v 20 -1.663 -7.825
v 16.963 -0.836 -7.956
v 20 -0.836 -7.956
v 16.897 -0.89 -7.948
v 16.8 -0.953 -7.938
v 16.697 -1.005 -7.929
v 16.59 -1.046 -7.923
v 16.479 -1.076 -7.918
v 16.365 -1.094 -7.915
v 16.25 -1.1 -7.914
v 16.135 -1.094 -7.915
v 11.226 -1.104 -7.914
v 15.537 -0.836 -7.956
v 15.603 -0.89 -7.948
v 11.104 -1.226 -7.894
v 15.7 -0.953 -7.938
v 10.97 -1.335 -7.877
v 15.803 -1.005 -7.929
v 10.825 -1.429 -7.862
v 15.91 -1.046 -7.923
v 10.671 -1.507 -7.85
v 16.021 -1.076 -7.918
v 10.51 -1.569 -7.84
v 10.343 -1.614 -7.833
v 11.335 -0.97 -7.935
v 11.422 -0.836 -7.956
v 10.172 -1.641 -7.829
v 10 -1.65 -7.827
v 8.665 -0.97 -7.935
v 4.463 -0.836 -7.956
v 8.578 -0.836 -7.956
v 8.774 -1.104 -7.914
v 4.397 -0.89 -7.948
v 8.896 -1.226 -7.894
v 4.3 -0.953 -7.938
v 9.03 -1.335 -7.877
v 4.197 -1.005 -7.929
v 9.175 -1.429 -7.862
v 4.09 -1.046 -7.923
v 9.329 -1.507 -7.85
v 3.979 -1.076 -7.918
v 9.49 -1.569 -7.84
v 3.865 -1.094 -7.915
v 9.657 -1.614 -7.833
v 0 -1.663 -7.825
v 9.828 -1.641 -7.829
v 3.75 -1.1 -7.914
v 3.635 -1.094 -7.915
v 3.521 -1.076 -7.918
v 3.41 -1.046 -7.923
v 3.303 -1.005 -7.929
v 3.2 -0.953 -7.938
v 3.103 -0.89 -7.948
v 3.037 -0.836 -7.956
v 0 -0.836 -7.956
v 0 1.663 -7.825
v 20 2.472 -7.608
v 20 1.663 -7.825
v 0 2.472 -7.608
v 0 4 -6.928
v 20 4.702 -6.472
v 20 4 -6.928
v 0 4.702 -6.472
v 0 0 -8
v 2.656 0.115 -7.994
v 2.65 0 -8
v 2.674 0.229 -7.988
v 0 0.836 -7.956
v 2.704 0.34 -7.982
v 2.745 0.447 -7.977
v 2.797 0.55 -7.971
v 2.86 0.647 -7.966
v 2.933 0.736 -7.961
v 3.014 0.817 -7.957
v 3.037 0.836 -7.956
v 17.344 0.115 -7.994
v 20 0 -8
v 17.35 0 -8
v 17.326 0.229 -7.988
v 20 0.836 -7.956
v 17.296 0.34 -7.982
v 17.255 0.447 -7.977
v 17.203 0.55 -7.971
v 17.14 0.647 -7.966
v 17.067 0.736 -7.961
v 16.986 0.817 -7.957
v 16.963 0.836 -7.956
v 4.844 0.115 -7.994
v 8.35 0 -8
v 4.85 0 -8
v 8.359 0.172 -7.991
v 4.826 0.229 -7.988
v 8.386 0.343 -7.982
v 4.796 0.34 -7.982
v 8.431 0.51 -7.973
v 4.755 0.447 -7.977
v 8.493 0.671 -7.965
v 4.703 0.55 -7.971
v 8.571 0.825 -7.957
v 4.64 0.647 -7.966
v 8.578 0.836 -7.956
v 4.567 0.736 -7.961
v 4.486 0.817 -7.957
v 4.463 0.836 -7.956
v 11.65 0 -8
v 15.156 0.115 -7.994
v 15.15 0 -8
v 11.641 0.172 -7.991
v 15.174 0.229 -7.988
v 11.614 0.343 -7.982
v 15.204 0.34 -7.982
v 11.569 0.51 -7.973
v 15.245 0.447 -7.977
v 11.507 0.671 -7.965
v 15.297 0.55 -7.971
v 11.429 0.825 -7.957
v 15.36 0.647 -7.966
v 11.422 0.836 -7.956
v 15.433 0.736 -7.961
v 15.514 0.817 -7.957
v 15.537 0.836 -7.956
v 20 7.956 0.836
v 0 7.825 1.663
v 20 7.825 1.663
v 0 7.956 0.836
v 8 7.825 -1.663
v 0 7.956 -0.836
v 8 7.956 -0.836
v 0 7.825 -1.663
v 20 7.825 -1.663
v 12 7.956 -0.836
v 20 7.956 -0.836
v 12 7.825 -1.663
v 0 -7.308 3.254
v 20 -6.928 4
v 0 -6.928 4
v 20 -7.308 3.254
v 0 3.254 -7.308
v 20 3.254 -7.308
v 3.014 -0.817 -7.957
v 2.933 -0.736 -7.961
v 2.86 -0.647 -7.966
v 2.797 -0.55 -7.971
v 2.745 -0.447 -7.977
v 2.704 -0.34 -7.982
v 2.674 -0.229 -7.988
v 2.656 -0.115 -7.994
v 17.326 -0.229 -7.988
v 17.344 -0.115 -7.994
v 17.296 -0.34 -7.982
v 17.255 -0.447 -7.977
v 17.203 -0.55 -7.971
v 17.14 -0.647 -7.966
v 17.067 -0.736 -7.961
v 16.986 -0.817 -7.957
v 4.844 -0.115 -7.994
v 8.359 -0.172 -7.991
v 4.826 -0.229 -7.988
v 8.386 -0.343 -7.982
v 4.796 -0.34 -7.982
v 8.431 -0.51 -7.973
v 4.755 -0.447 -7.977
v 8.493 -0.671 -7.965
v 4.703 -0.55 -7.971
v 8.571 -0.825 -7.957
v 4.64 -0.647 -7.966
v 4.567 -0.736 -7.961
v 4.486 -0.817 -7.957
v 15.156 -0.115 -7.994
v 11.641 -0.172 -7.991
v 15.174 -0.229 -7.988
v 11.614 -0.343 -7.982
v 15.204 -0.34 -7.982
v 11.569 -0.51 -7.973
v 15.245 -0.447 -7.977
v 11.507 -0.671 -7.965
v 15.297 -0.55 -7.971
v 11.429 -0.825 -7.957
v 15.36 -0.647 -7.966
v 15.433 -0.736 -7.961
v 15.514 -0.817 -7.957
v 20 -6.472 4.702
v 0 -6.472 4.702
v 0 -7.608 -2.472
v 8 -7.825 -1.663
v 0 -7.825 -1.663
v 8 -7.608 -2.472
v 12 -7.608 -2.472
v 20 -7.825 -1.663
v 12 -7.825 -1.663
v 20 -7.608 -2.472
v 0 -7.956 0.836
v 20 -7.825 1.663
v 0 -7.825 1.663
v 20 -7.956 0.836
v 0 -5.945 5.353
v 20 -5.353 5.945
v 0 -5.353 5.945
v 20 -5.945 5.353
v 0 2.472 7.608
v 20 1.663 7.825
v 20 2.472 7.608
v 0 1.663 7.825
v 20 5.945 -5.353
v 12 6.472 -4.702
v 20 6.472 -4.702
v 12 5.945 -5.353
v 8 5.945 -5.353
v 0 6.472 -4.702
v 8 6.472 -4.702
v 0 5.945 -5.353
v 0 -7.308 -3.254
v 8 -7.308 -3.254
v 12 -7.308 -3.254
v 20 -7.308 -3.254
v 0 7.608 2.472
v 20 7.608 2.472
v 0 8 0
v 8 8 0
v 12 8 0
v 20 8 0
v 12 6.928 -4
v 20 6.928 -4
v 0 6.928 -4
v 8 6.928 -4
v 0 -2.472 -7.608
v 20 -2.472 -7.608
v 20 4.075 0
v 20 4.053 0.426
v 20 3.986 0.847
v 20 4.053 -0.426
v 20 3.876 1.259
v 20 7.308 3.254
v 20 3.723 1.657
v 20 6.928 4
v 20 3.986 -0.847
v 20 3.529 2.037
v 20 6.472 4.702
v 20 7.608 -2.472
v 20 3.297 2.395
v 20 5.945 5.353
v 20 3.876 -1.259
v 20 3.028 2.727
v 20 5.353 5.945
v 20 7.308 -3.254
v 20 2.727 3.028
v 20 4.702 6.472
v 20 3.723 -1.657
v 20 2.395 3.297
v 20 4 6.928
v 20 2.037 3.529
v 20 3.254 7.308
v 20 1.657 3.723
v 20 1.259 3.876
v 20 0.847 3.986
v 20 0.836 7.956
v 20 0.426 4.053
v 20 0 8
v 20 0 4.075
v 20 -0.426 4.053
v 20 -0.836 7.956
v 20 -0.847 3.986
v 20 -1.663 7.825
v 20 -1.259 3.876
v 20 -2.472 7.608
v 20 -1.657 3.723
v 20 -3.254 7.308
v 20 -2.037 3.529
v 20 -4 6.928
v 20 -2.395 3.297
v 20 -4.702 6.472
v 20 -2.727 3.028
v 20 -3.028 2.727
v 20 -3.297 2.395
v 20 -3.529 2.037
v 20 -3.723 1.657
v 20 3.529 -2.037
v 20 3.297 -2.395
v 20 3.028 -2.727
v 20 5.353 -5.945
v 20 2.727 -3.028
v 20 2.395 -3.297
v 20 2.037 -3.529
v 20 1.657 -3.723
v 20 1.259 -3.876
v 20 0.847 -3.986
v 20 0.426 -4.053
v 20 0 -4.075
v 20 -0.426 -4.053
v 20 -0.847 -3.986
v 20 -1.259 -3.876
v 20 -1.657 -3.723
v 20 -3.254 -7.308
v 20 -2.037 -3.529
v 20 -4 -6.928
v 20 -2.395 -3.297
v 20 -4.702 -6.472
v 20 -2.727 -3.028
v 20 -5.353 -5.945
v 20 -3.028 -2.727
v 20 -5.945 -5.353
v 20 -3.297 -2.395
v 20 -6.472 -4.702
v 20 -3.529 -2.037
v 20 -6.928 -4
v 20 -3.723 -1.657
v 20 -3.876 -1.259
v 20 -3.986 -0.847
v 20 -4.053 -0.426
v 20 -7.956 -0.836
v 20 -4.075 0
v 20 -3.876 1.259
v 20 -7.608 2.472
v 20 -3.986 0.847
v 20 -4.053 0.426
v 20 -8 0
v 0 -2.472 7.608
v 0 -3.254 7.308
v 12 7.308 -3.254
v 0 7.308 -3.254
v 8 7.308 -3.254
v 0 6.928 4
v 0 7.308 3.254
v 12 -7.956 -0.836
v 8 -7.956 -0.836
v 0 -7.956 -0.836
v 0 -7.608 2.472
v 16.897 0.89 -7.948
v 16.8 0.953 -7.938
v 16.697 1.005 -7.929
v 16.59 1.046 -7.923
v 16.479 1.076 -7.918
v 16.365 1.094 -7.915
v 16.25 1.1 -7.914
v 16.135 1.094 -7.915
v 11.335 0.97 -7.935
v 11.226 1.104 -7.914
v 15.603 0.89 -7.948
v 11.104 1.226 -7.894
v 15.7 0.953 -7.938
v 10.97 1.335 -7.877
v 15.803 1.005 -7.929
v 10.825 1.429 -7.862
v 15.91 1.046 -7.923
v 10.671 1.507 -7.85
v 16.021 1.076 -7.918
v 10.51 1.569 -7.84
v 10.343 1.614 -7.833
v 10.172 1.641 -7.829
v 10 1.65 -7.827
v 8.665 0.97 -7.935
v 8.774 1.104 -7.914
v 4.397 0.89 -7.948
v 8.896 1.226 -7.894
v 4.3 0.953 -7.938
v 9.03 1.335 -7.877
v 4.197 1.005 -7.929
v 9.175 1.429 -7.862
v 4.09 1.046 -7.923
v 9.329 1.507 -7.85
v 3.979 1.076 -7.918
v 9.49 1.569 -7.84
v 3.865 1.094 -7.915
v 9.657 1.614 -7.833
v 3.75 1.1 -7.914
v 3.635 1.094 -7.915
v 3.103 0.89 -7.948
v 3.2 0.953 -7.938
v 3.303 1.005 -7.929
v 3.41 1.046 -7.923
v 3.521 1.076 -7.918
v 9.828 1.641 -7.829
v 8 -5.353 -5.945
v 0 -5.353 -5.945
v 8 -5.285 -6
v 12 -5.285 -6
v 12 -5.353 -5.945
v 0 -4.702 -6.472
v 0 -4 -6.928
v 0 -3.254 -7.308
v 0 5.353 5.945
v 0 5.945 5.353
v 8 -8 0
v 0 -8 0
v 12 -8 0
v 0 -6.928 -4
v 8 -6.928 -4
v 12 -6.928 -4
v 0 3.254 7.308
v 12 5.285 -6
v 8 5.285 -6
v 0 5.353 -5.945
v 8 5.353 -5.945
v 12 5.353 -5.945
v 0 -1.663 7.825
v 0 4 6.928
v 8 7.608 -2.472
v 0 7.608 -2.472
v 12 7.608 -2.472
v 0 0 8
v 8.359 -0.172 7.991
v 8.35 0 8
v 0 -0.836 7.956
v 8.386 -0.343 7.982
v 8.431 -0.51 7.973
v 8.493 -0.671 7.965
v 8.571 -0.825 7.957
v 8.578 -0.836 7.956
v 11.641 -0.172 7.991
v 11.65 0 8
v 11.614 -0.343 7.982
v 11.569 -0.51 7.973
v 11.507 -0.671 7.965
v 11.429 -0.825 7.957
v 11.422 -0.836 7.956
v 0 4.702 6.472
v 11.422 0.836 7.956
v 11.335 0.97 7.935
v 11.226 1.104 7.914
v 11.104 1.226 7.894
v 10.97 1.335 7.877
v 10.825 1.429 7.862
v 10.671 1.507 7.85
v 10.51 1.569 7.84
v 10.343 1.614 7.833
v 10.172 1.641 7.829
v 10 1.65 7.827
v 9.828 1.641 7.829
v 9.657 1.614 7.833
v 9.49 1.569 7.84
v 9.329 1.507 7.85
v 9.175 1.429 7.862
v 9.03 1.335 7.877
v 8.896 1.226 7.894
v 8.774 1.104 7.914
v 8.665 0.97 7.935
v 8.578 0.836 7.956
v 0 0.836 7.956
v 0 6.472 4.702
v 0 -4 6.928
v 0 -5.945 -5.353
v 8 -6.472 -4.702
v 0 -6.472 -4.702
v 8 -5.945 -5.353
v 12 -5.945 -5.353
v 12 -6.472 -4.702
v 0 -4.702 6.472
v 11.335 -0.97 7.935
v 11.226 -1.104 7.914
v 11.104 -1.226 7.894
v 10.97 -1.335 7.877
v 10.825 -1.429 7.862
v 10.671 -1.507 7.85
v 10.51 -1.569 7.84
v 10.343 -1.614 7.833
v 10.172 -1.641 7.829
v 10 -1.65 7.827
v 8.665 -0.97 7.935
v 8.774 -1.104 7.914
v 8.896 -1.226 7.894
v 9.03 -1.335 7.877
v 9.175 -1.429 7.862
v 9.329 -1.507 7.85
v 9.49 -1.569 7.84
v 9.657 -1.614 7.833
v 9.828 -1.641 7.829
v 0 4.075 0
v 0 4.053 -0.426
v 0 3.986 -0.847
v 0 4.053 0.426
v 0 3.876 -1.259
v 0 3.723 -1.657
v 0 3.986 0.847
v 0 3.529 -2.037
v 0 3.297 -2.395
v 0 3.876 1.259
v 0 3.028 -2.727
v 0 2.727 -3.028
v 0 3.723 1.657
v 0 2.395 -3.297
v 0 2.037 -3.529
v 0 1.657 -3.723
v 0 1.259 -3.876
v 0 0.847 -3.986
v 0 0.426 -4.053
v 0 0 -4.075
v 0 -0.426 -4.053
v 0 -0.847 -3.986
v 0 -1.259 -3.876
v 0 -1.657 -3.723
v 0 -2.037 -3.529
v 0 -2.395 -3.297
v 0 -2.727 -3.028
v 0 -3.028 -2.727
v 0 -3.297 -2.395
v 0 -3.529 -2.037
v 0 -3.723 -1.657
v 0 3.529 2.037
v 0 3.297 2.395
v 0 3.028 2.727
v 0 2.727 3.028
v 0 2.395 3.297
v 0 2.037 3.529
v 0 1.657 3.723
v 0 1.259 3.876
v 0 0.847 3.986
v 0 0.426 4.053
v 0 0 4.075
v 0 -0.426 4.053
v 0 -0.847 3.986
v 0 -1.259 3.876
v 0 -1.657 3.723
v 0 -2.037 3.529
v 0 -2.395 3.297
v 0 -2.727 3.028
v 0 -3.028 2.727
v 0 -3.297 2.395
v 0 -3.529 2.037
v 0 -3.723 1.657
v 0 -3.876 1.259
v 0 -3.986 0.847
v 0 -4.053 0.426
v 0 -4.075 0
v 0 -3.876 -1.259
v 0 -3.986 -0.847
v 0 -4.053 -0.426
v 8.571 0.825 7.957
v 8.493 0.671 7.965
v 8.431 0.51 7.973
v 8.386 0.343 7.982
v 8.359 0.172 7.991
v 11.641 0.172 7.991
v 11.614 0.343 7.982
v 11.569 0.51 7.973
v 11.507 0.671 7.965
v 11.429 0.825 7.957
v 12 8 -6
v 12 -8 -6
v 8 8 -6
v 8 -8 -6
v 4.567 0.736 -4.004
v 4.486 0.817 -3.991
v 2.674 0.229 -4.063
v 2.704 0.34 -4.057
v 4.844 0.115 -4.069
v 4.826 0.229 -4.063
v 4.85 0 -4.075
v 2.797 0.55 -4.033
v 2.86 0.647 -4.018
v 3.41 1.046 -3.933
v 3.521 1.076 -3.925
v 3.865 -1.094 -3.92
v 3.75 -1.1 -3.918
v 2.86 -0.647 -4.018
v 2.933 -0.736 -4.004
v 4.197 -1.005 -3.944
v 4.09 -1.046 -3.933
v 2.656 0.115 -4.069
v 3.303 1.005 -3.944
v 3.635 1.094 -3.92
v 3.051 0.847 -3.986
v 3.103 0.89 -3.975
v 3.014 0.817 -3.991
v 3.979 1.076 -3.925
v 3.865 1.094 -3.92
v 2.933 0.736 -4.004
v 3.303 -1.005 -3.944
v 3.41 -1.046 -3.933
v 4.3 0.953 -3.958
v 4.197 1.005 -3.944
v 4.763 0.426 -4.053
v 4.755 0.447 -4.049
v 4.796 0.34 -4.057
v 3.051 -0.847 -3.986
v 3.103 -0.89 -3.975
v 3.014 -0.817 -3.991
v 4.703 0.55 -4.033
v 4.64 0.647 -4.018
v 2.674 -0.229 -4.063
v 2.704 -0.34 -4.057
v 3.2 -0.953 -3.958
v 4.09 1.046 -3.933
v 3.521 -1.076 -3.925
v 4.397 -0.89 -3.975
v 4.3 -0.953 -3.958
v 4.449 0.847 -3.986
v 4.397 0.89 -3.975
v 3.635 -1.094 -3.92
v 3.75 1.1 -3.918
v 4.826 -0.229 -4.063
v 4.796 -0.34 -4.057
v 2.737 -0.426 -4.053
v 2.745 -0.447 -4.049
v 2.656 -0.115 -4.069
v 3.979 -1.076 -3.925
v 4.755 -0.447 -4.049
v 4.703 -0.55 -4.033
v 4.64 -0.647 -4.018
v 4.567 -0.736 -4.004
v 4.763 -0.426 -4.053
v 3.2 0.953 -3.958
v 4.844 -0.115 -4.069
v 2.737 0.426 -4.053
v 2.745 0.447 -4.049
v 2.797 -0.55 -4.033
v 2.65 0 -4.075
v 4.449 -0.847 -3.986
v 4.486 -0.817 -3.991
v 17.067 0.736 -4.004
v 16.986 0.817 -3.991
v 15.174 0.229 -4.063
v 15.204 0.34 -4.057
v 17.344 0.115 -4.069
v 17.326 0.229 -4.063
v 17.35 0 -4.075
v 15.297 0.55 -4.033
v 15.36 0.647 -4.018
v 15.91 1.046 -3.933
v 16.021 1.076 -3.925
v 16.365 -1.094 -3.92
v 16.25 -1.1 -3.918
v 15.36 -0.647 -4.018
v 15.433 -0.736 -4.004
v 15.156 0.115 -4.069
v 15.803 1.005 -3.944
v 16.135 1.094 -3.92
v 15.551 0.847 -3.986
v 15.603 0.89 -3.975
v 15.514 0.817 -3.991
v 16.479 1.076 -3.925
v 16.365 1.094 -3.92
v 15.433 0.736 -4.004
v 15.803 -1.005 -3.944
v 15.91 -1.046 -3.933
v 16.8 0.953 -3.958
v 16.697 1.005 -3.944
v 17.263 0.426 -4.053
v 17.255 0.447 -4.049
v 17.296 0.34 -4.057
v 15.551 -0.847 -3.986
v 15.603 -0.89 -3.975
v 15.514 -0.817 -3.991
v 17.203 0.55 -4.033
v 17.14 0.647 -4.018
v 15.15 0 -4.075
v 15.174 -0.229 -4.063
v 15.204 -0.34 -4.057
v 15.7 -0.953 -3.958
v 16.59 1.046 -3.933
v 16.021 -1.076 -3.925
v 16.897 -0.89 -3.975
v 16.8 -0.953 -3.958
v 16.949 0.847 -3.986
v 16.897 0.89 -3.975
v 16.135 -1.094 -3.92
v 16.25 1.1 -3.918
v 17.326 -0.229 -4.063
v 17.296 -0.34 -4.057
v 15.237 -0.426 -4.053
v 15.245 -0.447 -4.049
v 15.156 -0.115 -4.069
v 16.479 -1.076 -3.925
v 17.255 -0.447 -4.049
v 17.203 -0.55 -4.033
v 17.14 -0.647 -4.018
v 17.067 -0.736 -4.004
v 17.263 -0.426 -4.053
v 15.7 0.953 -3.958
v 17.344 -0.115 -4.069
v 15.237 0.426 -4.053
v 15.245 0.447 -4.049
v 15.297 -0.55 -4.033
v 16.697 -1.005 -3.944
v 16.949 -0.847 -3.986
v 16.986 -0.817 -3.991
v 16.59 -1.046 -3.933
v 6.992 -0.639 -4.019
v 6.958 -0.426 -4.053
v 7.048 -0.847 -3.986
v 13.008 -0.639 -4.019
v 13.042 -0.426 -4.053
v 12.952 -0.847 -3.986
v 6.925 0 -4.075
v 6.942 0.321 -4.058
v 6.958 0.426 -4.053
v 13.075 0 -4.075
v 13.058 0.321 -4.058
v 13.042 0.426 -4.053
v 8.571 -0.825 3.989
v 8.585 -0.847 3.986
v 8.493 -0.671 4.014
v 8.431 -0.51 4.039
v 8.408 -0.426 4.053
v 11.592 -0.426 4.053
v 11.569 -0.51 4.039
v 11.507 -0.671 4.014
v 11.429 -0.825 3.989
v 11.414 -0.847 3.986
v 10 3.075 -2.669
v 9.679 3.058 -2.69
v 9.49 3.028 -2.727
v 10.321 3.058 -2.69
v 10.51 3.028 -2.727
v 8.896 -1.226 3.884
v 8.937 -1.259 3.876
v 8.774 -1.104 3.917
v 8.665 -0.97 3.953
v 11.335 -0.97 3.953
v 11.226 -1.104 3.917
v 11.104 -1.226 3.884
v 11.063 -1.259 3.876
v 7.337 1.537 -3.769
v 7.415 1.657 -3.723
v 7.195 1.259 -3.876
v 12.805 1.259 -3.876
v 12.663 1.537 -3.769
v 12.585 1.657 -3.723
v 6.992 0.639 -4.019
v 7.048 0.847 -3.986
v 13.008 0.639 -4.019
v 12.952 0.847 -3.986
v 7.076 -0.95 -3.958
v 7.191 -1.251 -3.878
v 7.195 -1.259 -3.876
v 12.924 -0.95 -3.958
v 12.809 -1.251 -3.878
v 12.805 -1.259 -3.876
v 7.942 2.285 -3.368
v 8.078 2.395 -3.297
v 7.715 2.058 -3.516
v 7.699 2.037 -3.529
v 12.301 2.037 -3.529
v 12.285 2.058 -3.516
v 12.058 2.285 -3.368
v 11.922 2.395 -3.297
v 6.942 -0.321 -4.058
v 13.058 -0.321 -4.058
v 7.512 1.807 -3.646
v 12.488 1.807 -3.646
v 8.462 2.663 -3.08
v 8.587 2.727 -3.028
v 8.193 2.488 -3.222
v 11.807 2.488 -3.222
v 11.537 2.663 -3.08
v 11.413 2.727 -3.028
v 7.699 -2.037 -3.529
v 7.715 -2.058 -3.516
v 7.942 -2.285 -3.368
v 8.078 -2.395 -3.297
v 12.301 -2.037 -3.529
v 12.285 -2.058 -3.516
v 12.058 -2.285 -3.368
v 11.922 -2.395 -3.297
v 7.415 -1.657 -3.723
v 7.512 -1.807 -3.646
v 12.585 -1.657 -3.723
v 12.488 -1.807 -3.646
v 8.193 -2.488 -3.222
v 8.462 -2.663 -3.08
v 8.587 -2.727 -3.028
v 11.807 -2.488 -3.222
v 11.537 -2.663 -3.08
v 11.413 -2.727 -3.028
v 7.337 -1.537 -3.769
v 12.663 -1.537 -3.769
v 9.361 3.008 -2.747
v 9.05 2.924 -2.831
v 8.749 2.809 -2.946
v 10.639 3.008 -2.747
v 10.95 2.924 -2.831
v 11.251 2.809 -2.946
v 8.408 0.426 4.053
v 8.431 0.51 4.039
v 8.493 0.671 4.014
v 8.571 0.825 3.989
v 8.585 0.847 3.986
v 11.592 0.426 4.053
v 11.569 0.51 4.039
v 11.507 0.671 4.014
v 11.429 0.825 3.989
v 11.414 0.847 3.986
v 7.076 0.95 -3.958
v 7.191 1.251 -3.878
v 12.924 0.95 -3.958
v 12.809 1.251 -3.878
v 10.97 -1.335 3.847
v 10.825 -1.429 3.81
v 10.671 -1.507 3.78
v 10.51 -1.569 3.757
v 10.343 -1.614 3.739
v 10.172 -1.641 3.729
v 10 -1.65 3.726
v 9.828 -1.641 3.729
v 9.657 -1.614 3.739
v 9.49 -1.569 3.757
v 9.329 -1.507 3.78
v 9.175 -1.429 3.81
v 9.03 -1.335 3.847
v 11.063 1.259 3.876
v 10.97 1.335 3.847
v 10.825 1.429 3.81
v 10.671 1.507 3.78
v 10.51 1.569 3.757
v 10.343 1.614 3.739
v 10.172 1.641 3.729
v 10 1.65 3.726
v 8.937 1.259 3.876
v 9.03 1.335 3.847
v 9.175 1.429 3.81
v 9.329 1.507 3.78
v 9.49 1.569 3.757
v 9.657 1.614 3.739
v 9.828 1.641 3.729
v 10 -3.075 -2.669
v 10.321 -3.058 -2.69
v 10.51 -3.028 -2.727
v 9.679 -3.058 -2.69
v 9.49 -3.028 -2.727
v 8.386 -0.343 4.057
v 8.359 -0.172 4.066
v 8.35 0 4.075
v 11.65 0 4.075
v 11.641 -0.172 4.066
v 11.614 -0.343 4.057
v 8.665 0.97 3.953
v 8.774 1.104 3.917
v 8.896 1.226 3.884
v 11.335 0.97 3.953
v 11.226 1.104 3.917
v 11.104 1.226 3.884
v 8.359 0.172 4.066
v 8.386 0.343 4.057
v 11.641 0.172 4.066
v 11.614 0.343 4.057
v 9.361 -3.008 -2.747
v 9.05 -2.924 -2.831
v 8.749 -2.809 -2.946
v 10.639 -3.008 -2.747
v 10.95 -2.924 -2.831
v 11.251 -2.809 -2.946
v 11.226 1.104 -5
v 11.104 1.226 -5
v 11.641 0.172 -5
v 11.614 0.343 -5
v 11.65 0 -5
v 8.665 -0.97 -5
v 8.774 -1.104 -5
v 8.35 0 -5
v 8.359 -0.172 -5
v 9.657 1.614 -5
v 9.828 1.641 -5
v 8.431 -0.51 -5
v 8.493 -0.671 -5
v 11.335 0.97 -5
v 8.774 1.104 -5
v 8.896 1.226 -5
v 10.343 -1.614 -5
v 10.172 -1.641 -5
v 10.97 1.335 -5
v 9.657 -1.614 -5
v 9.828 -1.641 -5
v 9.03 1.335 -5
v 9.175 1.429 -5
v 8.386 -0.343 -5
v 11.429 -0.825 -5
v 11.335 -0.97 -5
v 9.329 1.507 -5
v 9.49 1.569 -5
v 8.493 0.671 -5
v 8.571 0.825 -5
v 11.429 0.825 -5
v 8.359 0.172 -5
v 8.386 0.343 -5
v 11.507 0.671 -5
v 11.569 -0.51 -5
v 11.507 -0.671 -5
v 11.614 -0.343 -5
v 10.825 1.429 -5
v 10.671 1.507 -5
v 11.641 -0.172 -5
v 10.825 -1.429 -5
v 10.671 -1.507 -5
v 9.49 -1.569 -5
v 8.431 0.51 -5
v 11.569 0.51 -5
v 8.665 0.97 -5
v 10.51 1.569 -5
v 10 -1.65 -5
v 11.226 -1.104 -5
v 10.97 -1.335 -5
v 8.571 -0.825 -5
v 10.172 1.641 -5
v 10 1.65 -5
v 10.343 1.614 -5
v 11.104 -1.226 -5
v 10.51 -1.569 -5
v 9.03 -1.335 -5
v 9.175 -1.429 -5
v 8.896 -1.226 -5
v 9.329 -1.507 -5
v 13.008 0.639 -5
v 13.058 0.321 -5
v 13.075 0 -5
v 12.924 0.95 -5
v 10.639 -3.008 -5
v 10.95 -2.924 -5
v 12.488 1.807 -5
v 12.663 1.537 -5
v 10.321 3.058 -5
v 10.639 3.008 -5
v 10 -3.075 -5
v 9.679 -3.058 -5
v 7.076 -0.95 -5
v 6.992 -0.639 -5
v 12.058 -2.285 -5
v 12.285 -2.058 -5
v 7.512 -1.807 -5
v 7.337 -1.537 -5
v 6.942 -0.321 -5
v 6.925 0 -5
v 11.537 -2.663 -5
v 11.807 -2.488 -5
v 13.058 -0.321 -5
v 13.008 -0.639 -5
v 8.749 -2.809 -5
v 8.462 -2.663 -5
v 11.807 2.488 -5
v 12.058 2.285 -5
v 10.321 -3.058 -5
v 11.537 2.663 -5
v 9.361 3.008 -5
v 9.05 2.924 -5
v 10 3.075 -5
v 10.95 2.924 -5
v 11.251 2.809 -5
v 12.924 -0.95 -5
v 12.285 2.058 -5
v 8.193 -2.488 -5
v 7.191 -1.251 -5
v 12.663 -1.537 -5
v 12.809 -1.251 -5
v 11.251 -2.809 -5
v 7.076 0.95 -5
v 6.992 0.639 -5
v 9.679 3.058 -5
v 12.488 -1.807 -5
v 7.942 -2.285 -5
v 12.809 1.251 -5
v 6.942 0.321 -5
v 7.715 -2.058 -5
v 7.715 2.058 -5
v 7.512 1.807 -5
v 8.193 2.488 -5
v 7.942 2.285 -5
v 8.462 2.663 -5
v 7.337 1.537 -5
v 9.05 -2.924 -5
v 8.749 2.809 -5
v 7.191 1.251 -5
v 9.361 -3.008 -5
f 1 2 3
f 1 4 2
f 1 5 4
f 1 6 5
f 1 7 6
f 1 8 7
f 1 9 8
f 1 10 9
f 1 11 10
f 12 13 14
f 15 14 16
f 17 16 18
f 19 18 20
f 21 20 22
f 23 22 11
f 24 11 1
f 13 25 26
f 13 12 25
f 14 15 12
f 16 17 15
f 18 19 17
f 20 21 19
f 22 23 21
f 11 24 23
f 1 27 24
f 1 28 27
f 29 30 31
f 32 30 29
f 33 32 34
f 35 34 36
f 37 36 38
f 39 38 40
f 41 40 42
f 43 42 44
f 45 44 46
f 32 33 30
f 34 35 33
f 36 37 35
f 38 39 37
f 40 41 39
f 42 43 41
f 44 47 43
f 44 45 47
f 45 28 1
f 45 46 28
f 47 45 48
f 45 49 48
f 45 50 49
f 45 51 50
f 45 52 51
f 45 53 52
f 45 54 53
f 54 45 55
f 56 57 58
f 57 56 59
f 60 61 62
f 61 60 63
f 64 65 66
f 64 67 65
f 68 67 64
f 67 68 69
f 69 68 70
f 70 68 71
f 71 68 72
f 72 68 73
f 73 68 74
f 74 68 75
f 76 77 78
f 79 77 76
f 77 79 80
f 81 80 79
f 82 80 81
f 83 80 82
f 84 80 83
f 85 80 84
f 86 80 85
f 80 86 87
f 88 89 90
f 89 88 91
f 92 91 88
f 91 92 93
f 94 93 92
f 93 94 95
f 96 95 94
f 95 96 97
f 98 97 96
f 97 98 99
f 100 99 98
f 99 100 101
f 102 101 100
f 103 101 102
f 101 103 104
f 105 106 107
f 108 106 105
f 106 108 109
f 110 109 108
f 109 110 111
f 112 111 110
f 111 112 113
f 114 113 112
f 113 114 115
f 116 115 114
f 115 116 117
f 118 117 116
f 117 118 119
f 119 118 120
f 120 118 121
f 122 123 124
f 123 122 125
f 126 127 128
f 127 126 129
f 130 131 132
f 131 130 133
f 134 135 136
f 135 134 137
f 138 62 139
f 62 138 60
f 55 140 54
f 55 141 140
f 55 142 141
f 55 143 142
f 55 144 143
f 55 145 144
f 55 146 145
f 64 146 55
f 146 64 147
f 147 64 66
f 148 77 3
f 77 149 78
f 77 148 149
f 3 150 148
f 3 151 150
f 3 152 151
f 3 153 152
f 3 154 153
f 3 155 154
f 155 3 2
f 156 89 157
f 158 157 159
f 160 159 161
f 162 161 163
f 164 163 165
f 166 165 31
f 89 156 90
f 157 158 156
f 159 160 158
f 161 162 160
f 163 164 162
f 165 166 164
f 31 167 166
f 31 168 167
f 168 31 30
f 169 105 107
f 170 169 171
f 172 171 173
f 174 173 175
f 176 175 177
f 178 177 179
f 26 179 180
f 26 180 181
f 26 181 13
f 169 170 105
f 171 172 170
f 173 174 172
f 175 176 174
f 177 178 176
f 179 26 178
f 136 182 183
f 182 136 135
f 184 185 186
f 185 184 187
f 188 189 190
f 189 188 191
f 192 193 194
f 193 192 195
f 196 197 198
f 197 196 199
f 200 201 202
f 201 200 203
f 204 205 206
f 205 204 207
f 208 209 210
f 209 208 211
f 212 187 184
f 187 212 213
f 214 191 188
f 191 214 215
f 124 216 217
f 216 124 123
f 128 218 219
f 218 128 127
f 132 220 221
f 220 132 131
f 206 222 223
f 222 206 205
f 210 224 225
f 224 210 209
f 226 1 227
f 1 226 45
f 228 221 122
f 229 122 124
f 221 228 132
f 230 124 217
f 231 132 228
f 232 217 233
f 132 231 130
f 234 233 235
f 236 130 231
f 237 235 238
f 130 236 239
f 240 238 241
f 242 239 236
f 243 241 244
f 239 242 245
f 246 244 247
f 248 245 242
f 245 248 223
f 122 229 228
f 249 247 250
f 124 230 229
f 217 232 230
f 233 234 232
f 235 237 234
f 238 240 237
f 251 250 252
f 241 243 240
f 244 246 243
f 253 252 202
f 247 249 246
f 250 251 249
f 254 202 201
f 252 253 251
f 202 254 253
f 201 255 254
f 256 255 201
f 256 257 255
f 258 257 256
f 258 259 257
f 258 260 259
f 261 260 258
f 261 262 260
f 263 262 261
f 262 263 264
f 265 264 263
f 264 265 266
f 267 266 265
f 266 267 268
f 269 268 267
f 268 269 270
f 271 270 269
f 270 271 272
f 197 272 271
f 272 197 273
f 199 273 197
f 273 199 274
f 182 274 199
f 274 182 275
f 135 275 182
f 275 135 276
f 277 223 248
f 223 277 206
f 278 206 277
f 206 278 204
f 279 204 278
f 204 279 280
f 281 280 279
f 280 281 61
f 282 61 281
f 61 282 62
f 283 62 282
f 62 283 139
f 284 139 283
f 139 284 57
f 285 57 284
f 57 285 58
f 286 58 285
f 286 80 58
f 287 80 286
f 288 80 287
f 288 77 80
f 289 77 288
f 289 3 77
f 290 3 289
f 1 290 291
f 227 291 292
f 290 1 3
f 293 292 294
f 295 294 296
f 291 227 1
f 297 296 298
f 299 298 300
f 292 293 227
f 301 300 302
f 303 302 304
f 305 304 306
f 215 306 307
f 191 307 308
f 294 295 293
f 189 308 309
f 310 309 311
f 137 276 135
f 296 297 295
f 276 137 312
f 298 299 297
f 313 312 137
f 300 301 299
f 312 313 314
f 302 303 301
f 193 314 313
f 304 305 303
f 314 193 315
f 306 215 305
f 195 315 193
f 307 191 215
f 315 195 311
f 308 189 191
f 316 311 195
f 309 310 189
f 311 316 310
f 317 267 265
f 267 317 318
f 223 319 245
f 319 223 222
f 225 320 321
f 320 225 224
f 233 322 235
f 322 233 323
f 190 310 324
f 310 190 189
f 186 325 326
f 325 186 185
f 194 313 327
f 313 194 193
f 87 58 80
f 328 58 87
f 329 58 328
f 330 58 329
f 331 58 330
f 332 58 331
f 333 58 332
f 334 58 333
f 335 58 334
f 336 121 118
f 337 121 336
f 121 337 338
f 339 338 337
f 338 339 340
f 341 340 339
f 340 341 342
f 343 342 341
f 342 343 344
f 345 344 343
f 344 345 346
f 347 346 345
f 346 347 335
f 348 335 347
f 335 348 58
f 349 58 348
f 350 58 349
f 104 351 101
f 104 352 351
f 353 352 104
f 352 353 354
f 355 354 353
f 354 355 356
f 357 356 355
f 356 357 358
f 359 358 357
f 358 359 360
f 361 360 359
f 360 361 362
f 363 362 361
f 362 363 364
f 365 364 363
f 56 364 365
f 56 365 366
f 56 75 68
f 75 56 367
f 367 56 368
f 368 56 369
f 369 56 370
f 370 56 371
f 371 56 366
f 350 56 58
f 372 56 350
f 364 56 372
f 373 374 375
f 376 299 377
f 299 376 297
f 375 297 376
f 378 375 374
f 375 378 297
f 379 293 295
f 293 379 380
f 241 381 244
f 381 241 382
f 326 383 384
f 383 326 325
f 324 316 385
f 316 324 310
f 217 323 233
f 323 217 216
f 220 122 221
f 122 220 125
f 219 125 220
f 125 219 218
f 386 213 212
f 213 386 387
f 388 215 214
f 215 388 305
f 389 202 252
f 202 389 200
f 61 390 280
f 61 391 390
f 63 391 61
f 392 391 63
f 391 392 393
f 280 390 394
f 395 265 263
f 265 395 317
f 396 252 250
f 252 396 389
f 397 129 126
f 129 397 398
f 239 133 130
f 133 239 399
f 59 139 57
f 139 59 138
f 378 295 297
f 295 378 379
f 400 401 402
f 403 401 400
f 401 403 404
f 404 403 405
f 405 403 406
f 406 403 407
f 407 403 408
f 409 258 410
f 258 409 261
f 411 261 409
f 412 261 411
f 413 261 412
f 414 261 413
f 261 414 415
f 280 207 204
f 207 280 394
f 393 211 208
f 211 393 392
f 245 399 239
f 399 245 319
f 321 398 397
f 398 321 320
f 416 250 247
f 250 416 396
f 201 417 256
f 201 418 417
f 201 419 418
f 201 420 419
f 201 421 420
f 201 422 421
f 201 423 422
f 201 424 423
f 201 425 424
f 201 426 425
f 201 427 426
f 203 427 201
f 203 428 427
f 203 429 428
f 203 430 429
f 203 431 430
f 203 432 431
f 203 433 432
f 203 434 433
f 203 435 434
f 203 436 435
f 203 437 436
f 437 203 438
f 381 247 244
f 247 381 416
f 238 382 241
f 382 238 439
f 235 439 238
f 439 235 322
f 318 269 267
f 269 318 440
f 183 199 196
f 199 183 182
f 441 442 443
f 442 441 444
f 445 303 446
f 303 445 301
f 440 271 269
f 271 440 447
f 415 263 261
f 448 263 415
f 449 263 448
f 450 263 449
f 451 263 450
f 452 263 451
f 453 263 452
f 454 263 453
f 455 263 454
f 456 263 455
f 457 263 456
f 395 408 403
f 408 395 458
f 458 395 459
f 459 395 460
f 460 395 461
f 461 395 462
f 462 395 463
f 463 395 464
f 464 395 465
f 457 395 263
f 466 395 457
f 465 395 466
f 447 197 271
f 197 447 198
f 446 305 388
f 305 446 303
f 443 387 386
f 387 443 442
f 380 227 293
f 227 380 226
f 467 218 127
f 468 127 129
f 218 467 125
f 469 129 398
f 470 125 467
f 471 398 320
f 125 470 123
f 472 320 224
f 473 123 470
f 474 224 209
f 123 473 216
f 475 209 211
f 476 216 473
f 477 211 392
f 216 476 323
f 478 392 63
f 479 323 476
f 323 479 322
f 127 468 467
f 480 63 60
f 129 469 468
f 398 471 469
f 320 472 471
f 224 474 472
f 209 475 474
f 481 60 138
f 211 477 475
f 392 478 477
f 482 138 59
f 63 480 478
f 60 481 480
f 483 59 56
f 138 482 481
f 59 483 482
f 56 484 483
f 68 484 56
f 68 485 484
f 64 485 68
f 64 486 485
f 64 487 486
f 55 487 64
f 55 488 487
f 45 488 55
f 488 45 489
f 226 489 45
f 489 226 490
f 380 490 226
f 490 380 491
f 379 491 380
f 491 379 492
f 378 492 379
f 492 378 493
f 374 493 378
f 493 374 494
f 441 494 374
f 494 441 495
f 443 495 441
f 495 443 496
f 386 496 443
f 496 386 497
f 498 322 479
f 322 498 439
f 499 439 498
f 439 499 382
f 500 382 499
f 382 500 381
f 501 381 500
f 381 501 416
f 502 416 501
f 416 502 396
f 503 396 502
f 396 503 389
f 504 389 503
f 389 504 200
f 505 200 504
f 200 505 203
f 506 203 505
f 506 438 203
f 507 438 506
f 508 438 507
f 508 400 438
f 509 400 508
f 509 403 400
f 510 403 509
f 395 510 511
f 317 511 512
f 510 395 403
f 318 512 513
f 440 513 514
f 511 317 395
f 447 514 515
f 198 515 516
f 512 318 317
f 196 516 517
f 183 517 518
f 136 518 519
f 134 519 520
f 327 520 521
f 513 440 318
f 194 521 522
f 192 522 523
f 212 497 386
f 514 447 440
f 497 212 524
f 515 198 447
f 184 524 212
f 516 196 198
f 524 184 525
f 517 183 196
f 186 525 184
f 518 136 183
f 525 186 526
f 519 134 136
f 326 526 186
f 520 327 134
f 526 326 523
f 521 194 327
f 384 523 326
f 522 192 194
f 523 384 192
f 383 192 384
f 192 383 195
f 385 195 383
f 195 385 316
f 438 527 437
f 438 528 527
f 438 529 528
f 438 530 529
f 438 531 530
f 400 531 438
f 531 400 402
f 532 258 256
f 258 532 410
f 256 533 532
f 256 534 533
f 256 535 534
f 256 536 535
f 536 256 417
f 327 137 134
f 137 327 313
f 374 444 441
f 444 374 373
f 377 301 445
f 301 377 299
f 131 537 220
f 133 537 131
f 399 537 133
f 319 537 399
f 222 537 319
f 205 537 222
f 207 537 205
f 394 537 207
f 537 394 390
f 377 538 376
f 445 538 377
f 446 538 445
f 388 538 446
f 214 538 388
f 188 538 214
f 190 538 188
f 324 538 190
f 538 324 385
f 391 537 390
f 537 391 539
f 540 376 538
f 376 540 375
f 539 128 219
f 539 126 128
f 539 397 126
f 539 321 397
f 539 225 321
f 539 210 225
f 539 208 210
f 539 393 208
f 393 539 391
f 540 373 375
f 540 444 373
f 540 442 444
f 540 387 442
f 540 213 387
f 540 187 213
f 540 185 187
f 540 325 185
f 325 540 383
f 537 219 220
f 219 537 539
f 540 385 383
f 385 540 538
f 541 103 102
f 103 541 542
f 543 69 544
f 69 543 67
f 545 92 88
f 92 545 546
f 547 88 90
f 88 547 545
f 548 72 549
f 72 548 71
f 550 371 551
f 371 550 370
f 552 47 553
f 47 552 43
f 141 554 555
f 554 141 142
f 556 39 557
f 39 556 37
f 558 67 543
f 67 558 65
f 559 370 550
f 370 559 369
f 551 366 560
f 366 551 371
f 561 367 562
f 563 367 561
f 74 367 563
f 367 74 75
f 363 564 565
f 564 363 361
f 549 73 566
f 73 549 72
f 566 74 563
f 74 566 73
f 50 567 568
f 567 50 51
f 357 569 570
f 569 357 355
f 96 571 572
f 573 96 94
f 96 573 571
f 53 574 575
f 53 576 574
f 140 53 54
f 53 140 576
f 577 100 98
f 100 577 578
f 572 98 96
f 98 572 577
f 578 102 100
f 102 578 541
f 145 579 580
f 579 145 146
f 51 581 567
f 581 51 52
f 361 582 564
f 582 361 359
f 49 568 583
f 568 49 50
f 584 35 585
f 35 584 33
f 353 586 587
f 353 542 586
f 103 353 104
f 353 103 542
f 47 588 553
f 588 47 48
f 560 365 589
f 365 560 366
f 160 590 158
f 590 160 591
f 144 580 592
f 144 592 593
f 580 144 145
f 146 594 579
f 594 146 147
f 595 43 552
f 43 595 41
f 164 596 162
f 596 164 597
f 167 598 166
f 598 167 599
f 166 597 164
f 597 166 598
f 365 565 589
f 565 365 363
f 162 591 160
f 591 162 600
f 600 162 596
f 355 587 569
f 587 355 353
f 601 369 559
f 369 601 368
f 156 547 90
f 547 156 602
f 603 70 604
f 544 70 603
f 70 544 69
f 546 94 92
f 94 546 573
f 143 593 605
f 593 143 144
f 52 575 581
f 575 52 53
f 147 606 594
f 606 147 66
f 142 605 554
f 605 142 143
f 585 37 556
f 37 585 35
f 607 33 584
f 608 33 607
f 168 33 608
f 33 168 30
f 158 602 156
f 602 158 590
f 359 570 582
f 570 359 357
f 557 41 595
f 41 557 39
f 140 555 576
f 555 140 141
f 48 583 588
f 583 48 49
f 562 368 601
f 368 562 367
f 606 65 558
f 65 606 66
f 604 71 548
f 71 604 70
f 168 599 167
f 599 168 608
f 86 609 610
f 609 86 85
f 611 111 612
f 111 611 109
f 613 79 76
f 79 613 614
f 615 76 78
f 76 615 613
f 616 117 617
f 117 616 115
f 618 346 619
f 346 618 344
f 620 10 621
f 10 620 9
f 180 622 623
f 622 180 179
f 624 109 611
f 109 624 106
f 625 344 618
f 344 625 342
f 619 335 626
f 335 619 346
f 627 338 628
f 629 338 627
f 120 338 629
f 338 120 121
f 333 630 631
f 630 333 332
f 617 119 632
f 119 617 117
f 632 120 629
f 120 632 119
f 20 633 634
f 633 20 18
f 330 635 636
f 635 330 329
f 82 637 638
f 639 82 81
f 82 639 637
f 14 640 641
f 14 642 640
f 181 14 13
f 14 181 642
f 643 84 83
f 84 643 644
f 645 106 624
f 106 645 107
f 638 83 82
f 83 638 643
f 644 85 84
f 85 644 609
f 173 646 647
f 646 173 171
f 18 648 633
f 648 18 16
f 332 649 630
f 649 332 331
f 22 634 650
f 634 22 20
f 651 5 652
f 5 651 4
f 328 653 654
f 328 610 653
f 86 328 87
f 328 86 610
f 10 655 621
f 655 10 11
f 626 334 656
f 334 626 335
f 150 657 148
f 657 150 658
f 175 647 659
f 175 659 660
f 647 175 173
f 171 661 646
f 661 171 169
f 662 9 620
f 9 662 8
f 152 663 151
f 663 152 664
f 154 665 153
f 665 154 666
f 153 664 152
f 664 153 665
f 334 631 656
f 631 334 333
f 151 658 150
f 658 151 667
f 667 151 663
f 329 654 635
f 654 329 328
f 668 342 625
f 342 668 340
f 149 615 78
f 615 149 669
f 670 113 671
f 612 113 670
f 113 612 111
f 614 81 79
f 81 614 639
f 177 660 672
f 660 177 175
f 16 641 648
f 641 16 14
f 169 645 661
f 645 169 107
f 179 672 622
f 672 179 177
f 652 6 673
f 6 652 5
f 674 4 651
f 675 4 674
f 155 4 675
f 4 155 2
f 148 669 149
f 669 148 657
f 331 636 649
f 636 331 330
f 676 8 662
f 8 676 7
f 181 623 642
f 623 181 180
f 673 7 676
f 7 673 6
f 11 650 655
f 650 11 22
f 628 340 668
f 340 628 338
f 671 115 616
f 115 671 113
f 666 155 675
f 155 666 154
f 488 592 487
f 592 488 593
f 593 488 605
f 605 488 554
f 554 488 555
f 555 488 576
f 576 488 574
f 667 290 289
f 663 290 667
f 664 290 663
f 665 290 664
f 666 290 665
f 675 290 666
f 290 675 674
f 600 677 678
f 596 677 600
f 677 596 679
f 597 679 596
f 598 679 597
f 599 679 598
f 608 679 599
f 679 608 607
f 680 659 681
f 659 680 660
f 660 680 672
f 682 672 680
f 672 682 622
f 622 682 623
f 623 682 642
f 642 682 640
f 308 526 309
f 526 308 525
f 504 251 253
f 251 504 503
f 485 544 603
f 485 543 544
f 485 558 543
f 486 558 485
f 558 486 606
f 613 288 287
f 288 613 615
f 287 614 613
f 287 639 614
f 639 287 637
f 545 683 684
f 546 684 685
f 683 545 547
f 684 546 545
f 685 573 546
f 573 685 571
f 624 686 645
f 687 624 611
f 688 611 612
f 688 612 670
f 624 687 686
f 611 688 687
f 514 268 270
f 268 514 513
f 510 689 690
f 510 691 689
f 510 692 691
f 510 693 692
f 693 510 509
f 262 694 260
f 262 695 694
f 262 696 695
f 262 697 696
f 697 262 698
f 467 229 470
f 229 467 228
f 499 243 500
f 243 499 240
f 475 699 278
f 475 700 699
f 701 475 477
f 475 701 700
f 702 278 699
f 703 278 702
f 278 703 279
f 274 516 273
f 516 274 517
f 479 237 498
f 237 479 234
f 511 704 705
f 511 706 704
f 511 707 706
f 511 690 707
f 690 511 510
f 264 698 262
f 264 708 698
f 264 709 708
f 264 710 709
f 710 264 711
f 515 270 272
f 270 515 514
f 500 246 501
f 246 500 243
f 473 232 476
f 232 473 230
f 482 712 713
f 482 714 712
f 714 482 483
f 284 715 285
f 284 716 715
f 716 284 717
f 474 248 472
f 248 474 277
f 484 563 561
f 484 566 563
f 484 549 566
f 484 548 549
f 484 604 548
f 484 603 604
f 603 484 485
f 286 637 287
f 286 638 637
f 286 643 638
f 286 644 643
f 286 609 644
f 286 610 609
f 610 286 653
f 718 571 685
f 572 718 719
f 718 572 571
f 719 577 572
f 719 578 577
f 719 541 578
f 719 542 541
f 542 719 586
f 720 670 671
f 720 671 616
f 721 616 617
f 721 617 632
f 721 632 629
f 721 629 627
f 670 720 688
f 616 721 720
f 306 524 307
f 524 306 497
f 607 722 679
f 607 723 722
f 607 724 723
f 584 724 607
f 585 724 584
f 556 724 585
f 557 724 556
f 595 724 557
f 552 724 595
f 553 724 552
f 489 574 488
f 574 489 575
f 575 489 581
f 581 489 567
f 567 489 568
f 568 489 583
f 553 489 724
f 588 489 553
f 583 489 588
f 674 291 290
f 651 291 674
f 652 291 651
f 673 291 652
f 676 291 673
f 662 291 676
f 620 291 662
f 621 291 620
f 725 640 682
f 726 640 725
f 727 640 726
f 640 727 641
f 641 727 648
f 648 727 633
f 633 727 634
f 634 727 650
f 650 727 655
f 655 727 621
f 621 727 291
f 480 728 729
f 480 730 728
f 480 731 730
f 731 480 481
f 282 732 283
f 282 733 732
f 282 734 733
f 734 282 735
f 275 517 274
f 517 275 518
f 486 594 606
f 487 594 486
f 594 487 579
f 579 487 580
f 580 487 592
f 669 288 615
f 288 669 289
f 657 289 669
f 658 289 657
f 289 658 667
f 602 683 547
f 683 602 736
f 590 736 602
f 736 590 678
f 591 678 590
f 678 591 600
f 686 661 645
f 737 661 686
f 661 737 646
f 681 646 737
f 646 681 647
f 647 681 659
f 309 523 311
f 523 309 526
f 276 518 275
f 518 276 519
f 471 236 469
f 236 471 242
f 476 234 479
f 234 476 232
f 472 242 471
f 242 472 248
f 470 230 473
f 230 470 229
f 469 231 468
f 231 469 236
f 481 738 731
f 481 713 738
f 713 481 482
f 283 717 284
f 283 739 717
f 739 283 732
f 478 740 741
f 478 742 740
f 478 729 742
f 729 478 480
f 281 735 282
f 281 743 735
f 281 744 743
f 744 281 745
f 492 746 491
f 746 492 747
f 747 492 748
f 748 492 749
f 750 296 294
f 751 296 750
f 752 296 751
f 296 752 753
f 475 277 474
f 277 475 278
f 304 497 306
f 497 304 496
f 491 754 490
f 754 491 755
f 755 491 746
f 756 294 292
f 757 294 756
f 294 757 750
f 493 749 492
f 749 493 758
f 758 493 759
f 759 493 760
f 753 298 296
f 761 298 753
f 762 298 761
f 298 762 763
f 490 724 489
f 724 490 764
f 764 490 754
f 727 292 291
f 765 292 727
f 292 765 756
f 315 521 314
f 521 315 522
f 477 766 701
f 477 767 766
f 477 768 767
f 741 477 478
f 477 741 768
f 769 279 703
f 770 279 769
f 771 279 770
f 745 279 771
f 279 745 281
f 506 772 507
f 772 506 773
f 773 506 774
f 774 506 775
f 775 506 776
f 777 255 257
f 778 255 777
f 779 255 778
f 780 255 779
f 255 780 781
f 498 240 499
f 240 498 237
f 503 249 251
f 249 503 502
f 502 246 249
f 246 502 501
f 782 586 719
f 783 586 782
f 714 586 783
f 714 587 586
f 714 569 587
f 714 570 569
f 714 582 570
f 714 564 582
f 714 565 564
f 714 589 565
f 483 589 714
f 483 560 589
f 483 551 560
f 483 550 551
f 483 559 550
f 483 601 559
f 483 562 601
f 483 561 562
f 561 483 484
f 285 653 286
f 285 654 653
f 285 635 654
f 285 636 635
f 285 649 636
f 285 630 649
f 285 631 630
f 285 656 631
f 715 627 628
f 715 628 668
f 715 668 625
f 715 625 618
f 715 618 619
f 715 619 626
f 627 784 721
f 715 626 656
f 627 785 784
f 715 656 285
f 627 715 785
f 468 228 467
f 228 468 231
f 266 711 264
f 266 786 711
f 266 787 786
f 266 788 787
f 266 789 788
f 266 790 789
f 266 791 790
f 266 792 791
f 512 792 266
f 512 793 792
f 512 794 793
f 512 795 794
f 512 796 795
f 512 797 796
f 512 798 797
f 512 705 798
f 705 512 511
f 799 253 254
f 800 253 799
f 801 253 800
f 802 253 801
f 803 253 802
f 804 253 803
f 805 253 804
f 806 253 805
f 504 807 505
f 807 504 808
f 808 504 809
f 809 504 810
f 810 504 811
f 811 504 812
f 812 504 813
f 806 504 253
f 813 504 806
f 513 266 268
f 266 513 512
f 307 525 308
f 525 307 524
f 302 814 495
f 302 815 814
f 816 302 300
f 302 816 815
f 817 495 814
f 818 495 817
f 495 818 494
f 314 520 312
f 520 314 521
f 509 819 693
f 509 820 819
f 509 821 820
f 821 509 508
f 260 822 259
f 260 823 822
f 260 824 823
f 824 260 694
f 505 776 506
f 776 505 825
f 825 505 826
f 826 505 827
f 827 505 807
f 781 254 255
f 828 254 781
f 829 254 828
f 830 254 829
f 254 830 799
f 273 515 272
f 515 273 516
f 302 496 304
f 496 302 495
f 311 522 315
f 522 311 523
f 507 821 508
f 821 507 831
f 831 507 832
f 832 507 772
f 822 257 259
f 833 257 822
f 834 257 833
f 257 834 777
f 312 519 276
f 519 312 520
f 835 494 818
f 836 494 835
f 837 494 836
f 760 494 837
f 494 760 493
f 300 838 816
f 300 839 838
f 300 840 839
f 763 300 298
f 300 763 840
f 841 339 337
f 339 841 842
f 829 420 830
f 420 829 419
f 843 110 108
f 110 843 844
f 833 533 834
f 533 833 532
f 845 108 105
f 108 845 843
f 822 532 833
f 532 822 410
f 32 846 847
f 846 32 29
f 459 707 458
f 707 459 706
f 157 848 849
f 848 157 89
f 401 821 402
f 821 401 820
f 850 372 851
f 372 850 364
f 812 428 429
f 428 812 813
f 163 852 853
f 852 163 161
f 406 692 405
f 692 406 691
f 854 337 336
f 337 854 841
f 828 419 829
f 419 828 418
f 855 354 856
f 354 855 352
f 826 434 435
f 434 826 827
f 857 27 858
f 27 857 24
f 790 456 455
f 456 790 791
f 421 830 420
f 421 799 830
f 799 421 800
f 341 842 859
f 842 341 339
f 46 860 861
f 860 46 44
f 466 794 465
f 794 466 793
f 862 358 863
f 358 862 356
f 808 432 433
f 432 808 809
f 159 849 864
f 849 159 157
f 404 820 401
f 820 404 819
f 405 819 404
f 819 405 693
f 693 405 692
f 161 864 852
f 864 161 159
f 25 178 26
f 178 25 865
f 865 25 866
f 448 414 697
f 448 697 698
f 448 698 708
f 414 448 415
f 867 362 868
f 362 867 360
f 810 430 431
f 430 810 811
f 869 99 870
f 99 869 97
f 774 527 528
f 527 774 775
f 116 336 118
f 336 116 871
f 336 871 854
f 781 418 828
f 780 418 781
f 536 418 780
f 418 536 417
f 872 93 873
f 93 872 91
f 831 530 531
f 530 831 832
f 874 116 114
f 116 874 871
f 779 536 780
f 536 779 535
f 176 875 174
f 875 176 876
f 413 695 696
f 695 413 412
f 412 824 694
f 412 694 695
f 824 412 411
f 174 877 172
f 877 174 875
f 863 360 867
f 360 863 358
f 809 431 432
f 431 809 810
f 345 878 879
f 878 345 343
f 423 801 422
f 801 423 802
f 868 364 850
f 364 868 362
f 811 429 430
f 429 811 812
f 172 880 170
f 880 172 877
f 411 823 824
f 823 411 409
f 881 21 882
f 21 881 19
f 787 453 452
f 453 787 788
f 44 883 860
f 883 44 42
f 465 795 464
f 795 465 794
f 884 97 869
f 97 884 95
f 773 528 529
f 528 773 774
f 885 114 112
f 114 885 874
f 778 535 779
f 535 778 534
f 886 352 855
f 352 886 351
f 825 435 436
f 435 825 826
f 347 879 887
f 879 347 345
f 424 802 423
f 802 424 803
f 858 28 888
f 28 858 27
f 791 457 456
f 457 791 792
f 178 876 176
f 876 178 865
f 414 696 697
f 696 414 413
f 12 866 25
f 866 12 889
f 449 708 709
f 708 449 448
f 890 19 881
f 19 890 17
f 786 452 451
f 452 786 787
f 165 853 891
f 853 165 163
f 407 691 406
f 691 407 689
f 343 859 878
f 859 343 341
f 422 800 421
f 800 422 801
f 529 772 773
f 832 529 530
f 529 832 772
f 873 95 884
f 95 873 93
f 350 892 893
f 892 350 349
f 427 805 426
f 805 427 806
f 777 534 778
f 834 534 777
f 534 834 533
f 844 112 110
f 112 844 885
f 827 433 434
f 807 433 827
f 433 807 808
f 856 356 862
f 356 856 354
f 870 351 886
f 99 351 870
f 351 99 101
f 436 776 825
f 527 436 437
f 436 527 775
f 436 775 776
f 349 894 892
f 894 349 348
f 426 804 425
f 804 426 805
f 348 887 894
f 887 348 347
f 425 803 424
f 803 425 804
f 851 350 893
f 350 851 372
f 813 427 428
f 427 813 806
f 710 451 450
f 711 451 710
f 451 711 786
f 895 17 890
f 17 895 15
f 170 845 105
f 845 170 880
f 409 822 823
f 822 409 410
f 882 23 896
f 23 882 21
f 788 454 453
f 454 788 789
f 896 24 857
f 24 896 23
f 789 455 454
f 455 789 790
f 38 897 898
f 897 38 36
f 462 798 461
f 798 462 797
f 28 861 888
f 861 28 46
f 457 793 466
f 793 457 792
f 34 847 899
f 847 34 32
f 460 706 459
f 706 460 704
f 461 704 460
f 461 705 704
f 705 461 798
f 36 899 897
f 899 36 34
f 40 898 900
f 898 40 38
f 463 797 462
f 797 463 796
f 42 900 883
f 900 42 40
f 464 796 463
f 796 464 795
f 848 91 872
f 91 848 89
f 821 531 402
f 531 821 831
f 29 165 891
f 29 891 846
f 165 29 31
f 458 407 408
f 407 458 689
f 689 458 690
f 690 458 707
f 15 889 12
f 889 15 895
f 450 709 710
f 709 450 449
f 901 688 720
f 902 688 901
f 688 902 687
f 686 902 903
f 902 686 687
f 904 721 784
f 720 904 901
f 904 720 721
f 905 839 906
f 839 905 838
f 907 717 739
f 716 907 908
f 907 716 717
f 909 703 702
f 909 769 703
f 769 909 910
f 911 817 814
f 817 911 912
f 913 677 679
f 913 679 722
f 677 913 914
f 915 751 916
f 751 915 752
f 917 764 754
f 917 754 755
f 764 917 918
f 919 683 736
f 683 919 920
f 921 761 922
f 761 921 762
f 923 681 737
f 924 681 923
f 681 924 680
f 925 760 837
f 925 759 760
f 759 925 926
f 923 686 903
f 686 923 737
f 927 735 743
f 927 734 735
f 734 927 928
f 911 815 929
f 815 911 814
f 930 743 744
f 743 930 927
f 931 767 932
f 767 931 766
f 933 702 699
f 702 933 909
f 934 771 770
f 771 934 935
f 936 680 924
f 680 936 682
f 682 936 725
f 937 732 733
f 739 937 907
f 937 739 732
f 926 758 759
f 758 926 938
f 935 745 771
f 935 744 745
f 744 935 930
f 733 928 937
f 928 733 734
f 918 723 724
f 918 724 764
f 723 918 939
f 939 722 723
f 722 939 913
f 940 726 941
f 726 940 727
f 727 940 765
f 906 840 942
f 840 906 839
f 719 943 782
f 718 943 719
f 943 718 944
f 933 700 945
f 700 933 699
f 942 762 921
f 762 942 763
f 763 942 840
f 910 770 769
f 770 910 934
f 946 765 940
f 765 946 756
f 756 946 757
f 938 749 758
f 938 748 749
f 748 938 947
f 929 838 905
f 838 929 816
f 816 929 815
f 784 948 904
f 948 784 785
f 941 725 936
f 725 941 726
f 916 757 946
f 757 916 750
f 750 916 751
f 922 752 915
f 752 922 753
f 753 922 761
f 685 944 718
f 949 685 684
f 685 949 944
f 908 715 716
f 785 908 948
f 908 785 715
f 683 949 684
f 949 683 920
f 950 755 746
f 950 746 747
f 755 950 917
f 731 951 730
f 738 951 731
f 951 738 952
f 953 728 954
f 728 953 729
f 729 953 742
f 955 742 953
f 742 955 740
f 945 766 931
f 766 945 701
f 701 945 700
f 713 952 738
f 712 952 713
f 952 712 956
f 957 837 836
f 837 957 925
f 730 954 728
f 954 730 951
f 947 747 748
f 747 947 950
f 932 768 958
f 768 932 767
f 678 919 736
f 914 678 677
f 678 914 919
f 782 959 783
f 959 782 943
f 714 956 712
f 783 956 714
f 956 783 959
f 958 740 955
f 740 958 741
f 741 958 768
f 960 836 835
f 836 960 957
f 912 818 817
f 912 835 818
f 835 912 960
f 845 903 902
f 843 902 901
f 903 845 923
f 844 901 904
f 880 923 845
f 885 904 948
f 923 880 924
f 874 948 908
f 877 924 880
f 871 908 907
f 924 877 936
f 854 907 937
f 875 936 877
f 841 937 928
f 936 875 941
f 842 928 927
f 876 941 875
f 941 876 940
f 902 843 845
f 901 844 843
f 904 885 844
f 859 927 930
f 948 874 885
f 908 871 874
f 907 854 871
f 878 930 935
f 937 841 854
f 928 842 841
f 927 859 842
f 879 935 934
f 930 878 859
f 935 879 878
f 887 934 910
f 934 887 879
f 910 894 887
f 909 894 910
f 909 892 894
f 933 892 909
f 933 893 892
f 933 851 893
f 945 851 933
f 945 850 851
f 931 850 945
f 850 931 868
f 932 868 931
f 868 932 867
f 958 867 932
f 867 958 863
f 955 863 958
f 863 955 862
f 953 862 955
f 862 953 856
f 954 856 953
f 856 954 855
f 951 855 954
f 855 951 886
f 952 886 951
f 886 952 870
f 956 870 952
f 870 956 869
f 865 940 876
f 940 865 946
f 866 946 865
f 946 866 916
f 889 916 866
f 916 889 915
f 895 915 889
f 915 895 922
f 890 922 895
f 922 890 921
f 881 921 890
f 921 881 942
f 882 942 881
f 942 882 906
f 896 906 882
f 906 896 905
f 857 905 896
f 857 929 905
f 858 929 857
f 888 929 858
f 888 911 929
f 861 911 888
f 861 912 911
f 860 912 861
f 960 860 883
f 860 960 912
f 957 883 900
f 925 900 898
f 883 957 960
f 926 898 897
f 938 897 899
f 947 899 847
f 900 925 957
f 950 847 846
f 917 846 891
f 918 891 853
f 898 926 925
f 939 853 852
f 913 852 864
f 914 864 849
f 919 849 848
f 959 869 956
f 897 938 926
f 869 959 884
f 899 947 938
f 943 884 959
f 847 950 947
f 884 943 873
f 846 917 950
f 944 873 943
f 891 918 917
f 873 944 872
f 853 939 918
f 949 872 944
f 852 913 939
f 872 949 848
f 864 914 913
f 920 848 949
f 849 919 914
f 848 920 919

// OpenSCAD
// ============================================================
// arm_end_mount.scad  —  Furuta 臂端座
// 功能：8mm铝管插座 + MR63轴承座 + AS5600安装
// ============================================================

$fn  = 60;
TOL  = 0.15;
WALL = 4;      // 孔壁最小厚度 mm

// ---------- 管 ----------
TUBE_D   = 8;          // 铝管外径
TUBE_IN  = 16;         // 管插入深度

// ---------- 轴承 MR63 ----------
BEARING_OD = 6.0;      // 外径
BEARING_ID  = 3.0;     // 内径
BEARING_H   = 2.5;     // 厚度

// ---------- 摆杆轴 ----------
SHAFT_D = 3.0;         // 摆杆轴承段直径

// ---------- AS5600 ----------
AS5600_HOLE_SPAN = 12.5;  // 两安装孔中心距
AS5600_SCREW_D   = 2.0;   // M2 安装孔
AS5600_OFFSET    = 3.0;   // PCB 距轴承底面的间隙 (留给磁铁+芯片厚度)

// ---------- 顶丝 ----------
SCREW_D = 3.0;        // M3

// ============================================================
// 尺寸计算
// ============================================================
BOSS_R    = TUBE_D/2 + 4;           // 管套外半径
BODY_H    = TUBE_IN + 4;            // 管座总长 (水平)
BEARING_BOSS_H = 5;                 // 轴承座凸台高度

// 底部 AS5600 安装面总宽 (轴承座 + 两侧孔)
PCB_W = AS5600_HOLE_SPAN + 8;       // 比孔距宽一点

// ============================================================
module arm_end_mount() {
    difference() {
        union() {
            // ---- 水平管套 ----
            translate([0, 0, 0])
                rotate([0, 90, 0])
                    cylinder(d=TUBE_D + WALL*2, h=BODY_H);

            // ---- 过渡加强筋 (管套 → 轴承座) ----
            translate([BODY_H/2 - 2, -BOSS_R, -6])
                cube([4, BOSS_R*2, 6]);

            // ---- 轴承凸台 (向下) ----
            translate([BODY_H/2, 0, -BEARING_BOSS_H])
                cylinder(d=BEARING_OD + 4, h=BEARING_BOSS_H);

            // ---- AS5600 安装耳 (向下延伸) ----
            for (x = [-AS5600_HOLE_SPAN/2, AS5600_HOLE_SPAN/2]) {
                translate([BODY_H/2 + x, 0, -BEARING_BOSS_H])
                    cylinder(d=5, h=BEARING_BOSS_H + AS5600_OFFSET + 3);
            }
        }

        // ---- 铝管孔 ----
        translate([-1, 0, 0])
            rotate([0, 90, 0])
                cylinder(d=TUBE_D + TOL, h=BODY_H + 5);

        // ---- 摆杆轴通孔 (3mm) ----
        translate([BODY_H/2, 0, -BEARING_BOSS_H - AS5600_OFFSET - 5])
            cylinder(d=SHAFT_D + 0.3, h=BEARING_BOSS_H + AS5600_OFFSET + 15);

        // ---- 轴承座腔 (6mm OD, 从底部向上挖) ----
        translate([BODY_H/2, 0, -BEARING_BOSS_H])
            cylinder(d=BEARING_OD + 0.15, h=BEARING_H + 0.3);

        // ---- M2 AS5600 安装孔 ----
        for (x = [-AS5600_HOLE_SPAN/2, AS5600_HOLE_SPAN/2]) {
            translate([BODY_H/2 + x, 0, -BEARING_BOSS_H - AS5600_OFFSET - 5])
                cylinder(d=AS5600_SCREW_D + 0.2, h=10);
        }

        // ---- M3 顶丝 — 锁铝管 (从上面) ----
        translate([BODY_H/2, 0, BOSS_R])
            cylinder(d=SCREW_D + 0.2, h=10, center=true);
    }
}

arm_end_mount();


// ============================================================
// Assembly:
//   1. 8mm 铝管从左侧插入水平孔，顶丝锁紧
//   2. MR63 轴承从下方压入 6mm 腔
//   3. 摆杆轴 (3mm) 从上方穿过轴承
//   4. 径向磁铁粘在摆杆轴下端
//   5. AS5600 PCB 用 M2 螺丝固定在底部两耳
//   6. 磁铁距芯片面 ~1-2mm
// ============================================================
